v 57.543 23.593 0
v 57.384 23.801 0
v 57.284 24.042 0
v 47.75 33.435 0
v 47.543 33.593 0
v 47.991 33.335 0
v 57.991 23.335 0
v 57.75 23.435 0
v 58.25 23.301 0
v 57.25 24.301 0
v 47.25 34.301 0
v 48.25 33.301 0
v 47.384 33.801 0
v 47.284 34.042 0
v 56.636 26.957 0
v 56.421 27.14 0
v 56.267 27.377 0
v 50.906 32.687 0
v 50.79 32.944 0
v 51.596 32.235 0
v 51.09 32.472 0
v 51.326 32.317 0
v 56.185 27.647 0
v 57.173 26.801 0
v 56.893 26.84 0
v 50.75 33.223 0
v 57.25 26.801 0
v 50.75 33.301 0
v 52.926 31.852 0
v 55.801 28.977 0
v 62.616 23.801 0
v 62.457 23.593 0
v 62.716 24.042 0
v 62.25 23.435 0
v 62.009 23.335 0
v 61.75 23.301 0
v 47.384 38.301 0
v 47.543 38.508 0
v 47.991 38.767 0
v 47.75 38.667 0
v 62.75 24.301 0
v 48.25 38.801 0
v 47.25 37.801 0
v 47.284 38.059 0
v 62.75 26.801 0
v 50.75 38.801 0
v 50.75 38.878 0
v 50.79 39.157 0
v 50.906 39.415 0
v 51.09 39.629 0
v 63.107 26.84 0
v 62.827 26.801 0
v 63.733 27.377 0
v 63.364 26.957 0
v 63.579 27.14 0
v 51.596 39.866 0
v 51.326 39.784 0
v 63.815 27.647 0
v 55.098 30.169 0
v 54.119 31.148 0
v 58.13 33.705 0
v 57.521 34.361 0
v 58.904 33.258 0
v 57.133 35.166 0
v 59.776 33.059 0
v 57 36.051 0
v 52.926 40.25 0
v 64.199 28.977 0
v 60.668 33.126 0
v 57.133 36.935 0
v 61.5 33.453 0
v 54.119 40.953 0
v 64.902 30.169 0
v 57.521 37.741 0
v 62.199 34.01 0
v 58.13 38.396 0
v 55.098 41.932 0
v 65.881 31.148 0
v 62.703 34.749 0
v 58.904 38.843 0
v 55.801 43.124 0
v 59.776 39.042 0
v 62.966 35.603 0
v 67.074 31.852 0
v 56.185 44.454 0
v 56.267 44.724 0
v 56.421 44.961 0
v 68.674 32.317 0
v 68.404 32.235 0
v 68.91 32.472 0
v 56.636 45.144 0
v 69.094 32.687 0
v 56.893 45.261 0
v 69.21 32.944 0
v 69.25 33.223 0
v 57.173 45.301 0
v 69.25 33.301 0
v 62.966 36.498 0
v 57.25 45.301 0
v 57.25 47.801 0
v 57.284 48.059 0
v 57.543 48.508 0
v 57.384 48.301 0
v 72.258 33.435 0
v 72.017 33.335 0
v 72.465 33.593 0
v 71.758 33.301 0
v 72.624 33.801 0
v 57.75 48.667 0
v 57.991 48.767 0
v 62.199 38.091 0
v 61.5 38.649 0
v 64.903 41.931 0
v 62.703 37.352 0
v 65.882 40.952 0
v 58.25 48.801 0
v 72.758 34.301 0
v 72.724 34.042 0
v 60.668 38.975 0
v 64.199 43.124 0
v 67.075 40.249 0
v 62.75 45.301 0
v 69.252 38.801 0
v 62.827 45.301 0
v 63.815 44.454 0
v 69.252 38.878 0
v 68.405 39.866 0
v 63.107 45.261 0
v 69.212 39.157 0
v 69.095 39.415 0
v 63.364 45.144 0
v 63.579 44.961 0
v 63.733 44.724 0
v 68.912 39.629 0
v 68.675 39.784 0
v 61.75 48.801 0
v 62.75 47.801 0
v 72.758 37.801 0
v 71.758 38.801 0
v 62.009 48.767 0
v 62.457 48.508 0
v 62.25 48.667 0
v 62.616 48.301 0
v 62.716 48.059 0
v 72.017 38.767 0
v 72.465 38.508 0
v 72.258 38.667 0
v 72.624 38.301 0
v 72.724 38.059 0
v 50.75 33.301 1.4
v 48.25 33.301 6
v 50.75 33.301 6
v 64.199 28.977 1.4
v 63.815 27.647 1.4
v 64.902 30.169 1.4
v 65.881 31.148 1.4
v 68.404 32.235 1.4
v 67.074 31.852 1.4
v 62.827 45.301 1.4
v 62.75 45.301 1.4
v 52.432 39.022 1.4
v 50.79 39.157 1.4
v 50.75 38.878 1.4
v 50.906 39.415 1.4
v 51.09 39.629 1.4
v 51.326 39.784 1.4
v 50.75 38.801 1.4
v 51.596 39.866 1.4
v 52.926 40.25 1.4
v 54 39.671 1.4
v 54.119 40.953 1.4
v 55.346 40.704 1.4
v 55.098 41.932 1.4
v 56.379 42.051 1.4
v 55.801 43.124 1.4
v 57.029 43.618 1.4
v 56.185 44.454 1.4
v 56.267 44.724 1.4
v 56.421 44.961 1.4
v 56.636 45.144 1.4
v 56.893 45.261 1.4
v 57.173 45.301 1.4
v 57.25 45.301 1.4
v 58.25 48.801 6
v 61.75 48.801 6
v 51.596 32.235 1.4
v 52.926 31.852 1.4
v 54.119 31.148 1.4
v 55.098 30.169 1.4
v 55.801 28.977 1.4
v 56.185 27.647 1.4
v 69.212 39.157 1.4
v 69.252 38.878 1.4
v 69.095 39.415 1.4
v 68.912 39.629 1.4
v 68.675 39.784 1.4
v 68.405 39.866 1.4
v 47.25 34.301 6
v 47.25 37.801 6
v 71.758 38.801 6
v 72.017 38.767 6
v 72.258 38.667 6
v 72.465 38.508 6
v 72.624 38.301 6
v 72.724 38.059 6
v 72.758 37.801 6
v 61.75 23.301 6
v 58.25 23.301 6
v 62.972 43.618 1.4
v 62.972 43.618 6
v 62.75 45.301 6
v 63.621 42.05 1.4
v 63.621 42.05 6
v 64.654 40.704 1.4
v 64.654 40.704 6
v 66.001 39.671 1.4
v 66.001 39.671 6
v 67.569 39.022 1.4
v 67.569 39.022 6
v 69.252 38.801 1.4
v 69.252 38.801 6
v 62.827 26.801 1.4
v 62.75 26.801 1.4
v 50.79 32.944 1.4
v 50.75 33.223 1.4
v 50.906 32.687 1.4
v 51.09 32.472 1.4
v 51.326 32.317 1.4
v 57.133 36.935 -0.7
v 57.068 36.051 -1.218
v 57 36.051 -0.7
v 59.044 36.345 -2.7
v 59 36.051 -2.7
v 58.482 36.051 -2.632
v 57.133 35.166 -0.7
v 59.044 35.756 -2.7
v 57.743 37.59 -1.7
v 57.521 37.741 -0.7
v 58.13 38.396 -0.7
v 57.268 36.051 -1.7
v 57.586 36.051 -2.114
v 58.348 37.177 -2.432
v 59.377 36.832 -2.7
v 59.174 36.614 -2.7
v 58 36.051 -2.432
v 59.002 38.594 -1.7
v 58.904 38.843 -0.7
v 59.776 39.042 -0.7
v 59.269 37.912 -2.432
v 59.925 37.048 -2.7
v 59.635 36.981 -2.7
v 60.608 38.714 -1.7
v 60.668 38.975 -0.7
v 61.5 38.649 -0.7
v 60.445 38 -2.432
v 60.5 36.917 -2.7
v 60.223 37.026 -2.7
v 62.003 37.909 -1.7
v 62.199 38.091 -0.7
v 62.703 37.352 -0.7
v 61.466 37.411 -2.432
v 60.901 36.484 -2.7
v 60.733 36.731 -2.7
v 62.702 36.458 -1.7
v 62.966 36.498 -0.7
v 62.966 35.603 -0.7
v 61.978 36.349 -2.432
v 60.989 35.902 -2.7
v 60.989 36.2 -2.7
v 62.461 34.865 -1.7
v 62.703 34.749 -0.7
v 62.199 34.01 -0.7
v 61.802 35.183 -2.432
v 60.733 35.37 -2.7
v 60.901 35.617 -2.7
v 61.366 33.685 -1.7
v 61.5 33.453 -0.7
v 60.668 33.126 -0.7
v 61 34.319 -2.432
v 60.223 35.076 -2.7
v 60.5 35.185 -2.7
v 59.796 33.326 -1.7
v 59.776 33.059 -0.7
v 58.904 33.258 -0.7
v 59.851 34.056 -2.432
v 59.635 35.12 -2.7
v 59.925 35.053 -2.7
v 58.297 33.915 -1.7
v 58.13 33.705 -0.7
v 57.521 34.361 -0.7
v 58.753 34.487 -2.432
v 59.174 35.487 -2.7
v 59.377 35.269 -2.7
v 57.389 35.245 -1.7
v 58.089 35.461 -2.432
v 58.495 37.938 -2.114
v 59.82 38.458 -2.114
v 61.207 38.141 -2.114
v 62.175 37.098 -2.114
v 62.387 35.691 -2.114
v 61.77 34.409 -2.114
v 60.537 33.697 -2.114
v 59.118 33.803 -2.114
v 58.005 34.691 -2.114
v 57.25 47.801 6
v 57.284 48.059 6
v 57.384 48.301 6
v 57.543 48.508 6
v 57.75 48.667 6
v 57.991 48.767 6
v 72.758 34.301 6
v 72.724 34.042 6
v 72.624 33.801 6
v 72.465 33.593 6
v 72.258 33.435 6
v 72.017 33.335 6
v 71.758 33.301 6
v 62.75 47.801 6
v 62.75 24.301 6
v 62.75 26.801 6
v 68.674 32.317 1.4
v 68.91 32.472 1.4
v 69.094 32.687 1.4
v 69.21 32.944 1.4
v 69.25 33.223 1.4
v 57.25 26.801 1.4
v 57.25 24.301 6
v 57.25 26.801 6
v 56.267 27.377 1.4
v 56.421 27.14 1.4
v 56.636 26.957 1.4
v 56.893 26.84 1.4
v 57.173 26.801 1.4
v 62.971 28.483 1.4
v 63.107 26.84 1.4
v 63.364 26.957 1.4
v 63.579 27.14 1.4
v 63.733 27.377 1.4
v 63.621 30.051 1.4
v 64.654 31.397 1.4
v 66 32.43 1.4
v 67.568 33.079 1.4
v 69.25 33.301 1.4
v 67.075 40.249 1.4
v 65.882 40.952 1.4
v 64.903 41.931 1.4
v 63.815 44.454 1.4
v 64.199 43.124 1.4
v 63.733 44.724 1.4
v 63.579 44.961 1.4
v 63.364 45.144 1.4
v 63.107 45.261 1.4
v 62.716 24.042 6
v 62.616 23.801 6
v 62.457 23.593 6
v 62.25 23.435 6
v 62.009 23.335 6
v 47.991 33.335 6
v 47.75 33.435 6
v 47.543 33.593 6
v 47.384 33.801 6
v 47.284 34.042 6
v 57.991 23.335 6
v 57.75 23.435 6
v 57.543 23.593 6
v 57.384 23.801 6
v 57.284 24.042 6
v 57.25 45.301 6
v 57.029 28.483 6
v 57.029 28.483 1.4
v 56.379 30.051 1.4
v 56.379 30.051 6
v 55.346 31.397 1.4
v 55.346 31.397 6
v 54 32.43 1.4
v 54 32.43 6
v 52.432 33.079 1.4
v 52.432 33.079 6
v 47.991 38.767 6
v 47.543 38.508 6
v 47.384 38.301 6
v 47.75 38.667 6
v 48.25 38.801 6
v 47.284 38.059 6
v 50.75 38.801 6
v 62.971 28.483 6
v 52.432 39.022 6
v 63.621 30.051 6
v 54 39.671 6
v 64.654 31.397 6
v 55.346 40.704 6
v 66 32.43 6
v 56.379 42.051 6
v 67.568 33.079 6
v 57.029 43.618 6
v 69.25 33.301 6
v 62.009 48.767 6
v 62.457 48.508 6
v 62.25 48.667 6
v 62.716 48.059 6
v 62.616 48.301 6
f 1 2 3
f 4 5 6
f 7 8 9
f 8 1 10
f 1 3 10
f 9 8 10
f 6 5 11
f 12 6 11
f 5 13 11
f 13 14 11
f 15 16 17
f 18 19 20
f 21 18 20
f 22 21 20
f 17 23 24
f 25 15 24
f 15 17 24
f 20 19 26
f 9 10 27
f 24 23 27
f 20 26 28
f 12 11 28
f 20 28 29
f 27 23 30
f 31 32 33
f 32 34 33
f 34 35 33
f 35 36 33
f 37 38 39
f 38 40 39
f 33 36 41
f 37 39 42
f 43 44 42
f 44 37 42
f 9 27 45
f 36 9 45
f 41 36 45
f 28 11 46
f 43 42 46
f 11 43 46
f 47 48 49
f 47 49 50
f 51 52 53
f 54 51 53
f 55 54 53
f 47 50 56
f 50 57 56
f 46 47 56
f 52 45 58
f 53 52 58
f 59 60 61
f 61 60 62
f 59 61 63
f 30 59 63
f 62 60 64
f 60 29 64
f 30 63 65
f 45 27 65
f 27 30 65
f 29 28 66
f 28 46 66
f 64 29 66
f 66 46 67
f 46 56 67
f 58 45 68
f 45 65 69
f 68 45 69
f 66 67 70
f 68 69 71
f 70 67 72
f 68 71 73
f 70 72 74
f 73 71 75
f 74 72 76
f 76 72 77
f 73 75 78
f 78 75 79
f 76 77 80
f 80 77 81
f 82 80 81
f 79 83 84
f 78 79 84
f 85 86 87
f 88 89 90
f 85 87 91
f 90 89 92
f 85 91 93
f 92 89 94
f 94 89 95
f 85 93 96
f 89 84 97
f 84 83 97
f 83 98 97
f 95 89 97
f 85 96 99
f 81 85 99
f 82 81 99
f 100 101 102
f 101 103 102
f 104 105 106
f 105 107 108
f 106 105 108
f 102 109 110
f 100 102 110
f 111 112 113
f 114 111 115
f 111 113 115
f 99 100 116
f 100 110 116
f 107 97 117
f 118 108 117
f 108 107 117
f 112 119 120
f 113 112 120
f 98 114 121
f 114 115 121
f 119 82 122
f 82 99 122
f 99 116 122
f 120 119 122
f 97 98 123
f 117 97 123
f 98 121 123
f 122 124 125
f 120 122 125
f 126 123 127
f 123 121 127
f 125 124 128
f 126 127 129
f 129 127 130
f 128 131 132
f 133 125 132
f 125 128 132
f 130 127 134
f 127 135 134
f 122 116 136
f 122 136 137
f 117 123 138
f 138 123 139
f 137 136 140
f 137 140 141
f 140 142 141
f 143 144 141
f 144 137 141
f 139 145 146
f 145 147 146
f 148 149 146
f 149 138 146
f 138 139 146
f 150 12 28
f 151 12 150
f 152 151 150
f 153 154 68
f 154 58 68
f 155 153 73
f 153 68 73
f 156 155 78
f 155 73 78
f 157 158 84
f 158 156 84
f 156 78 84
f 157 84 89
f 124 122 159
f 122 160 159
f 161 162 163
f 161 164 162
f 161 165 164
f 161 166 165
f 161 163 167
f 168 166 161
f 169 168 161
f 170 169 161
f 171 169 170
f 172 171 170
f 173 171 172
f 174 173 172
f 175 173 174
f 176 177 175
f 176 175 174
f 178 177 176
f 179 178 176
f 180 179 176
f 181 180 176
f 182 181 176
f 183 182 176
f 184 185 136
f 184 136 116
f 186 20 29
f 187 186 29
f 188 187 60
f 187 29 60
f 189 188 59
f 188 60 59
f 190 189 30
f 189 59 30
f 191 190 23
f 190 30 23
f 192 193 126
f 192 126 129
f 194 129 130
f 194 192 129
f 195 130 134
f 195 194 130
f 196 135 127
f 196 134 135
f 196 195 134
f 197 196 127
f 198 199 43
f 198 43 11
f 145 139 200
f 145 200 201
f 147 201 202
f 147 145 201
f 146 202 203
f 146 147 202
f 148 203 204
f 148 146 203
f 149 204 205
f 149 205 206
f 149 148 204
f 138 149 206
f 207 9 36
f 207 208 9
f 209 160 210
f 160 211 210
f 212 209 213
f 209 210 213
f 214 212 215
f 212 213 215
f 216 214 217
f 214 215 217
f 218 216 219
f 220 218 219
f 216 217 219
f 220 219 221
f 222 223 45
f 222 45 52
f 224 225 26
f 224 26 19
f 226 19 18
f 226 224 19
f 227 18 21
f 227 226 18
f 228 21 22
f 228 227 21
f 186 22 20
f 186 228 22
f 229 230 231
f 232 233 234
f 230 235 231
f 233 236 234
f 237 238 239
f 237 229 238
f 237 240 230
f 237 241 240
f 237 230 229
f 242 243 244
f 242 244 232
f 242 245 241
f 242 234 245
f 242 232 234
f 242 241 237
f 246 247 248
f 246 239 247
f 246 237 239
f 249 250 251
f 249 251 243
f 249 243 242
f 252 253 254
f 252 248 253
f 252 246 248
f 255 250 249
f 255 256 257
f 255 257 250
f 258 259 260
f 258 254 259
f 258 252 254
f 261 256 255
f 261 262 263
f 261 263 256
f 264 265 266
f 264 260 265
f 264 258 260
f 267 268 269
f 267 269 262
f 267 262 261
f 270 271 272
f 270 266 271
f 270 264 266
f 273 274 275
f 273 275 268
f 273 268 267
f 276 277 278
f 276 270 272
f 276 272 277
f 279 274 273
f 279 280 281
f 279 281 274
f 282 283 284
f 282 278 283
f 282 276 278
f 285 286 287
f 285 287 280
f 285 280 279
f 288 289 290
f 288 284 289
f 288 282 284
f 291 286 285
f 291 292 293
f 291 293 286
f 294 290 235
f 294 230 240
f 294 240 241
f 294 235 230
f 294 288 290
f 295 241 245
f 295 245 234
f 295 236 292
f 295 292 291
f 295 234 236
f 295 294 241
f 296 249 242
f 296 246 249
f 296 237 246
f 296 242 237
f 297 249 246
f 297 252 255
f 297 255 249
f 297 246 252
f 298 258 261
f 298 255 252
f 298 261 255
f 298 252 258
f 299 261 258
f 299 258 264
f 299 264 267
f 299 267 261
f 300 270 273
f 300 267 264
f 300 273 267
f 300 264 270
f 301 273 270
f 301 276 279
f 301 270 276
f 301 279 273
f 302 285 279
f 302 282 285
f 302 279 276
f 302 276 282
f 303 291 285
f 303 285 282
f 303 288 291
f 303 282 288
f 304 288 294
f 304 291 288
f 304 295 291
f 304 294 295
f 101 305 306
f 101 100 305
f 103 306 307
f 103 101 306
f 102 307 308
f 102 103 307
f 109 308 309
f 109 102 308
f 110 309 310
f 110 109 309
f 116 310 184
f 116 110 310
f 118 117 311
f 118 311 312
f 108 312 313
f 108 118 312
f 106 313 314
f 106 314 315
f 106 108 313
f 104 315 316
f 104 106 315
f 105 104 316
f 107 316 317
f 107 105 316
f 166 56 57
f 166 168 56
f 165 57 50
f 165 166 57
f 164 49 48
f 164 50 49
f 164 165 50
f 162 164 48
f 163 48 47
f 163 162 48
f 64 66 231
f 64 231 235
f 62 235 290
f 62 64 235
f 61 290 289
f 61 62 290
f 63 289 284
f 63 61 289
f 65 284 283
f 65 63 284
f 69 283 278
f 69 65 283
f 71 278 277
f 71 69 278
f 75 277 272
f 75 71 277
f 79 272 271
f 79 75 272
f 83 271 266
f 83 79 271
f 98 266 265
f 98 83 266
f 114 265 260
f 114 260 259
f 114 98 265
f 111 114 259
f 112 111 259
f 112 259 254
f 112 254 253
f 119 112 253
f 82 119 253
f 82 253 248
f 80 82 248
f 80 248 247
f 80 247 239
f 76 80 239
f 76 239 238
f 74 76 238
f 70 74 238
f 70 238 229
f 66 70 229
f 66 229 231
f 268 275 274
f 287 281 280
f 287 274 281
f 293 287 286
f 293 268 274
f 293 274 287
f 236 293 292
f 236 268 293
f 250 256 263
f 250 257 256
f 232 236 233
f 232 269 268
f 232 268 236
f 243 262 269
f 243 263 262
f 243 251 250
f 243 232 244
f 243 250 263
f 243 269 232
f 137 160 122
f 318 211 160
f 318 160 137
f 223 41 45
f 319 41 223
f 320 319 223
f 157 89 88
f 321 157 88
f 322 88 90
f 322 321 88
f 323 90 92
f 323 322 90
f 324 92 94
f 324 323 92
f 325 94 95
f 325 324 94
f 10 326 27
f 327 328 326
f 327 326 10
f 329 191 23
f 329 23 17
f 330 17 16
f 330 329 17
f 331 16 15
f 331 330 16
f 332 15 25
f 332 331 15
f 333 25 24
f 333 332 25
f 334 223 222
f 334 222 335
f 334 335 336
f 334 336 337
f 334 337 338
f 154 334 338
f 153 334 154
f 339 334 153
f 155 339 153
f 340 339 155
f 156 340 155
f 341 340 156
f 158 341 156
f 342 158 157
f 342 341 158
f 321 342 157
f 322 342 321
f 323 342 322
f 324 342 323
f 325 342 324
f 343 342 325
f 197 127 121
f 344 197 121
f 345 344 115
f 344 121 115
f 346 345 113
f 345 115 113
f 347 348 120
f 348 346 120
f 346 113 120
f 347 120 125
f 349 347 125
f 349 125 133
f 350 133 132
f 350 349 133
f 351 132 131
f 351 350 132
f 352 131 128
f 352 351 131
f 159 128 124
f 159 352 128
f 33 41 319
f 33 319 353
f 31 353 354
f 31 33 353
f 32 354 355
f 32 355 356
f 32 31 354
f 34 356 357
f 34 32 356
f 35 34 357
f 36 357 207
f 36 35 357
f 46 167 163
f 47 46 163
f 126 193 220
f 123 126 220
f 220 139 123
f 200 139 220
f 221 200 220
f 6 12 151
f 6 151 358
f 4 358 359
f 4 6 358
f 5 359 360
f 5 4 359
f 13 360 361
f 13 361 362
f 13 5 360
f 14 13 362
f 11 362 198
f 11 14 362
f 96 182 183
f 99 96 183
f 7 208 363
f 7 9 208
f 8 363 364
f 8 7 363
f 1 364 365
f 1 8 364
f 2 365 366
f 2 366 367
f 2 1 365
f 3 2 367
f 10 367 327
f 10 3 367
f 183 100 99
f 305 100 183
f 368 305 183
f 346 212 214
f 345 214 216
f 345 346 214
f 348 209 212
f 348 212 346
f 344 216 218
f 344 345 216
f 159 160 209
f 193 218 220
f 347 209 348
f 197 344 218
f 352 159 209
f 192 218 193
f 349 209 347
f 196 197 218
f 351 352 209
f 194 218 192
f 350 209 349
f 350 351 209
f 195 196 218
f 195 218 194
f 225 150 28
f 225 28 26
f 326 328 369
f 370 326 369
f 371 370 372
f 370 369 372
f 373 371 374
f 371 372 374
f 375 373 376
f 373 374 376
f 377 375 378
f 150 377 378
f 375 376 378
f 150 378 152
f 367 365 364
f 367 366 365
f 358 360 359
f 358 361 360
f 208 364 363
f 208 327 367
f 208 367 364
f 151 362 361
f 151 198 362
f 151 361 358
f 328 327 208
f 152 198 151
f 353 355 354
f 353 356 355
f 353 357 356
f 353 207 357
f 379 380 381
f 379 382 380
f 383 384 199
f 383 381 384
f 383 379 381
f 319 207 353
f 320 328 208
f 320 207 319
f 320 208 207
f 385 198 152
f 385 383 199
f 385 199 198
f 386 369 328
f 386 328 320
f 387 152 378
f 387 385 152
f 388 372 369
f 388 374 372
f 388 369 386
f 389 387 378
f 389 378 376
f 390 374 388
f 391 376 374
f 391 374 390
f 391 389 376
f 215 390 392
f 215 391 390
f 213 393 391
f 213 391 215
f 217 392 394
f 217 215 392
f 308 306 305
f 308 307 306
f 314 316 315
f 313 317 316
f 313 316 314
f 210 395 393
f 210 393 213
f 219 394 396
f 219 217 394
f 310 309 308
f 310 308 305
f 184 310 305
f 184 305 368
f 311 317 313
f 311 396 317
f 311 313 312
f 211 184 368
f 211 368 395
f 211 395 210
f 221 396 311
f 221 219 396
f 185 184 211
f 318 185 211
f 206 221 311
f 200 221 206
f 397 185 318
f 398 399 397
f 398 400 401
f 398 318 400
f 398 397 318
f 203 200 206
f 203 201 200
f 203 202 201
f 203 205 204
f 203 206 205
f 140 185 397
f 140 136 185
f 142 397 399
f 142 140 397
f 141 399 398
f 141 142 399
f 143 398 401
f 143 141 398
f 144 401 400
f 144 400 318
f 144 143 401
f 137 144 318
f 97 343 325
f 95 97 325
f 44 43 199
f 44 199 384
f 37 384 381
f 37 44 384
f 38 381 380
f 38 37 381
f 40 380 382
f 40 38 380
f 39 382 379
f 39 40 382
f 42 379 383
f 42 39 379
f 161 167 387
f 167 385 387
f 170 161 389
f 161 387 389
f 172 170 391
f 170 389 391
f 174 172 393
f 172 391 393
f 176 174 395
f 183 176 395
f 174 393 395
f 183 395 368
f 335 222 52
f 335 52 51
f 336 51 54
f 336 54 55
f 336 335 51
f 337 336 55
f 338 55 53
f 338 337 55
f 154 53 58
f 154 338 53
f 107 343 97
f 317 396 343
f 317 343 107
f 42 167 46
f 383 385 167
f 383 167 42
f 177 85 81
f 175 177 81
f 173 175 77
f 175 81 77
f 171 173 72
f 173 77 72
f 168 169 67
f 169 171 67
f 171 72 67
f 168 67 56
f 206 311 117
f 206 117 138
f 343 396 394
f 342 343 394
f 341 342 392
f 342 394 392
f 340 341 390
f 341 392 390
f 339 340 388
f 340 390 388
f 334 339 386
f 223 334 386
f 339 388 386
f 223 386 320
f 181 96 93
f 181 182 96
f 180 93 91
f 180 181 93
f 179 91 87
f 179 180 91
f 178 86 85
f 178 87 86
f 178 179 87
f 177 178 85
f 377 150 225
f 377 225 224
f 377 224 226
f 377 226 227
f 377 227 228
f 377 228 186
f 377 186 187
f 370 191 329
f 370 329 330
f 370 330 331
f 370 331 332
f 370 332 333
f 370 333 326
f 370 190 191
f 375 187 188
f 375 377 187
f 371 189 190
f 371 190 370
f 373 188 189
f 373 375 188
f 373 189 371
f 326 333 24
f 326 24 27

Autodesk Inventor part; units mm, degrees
ref_plane "YZ Plane" through (0, 0, 0) normal (1, 0, 0) x (0, 1, 0)
ref_plane "XZ Plane" through (0, 0, 0) normal (0, 1, 0) x (-1, 0, 0)
ref_plane "XY Plane" through (0, 0, 0) normal (0, 0, 1) x (1, 0, 0)
sketch "Sketch1" plane through (0, 0, 0) normal (0, 0, 1) x (1, 0, 0)
  line L0 (50.75, 32.3006) -> (46.25, 32.3006)
  line L1 (46.25, 32.3006) -> (46.25, 39.8006)
  line L2 (46.25, 39.8006) -> (50.75, 39.8006)
  arc A0 (50.75, 39.8006) -> (56.25, 45.3006) centre (50.75, 45.3006) ccw
  line L3 (56.25, 45.3006) -> (56.25, 49.8006)
  line L4 (56.25, 49.8006) -> (63.75, 49.8006)
  line L5 (63.75, 49.8006) -> (63.75, 45.3006)
  arc A1 (63.75, 45.3006) -> (69.2516, 39.8006) centre (69.25, 45.3006) ccw
  line L6 (69.2516, 39.8006) -> (73.7503, 39.8165)
  line L7 (73.7503, 39.8165) -> (73.7589, 32.3006)
  line L8 (73.7589, 32.3006) -> (69.25, 32.3006)
  arc A2 (69.25, 32.3006) -> (63.75, 26.8006) centre (69.25, 26.8006) ccw
  line L9 (63.75, 26.8006) -> (63.75, 22.3006)
  line L10 (63.75, 22.3006) -> (56.25, 22.3006)
  line L11 (56.25, 22.3006) -> (56.25, 26.8006)
  arc A3 (56.25, 26.8006) -> (50.75, 32.3006) centre (50.75, 26.8006) ccw
  line L12 (47.25, 33.3006) -> (50.75, 33.3006)
  arc A4 (57.25, 26.8006) -> (50.75, 33.3006) centre (50.75, 26.8006) ccw
  line L13 (57.25, 26.8006) -> (57.25, 23.3006)
  line L14 (57.25, 23.3006) -> (62.75, 23.3006)
  line L15 (62.75, 23.3006) -> (62.75, 26.8006)
  arc A5 (69.25, 33.3006) -> (62.75, 26.8006) centre (69.25, 26.8006) ccw
  line L16 (69.25, 33.3006) -> (72.7578, 33.3006)
  line L17 (72.7578, 33.3006) -> (72.7514, 38.813)
  line L18 (72.7514, 38.813) -> (69.2535, 38.8006)
  arc A6 (62.75, 45.3006) -> (69.2535, 38.8006) centre (69.25, 45.3006) ccw
  line L19 (62.75, 45.3006) -> (62.75, 48.8006)
  line L20 (62.75, 48.8006) -> (57.25, 48.8006)
  line L21 (57.25, 48.8006) -> (57.25, 45.3006)
  arc A7 (50.75, 38.8006) -> (57.25, 45.3006) centre (50.75, 45.3006) ccw
  line L22 (50.75, 38.8006) -> (47.25, 38.8006)
  line L23 (47.25, 38.8006) -> (47.25, 33.3006)
  point P0 (0, 0)
  dimension "d47" = 1
extrude "Extrusion1" add sketch "Sketch1" along normal blind 6 contours L0 L1 L2 A0 L3 L4 L5 A1 L6 L7 L8 A2 L9 L10 L11 A3 | L23 L22 A7 L21 L20 L19 A6 L18 L17 L16 A5 L15 L14 L13 A4 L12
sketch "Sketch2" plane through (0, 0, 6) normal (0, 0, 1) x (1, 0, 0)
  line L0 (50.75, 32.3006) -> (46.25, 32.3006)
  line L1 (46.25, 32.3006) -> (46.25, 39.8006)
  line L2 (46.25, 39.8006) -> (50.75, 39.8006)
  arc A0 (50.75, 39.8006) -> (56.25, 45.3006) centre (50.75, 45.3006) ccw
  line L3 (56.25, 49.8006) -> (63.75, 49.8006)
  line L4 (63.75, 49.8006) -> (63.75, 45.3006)
  arc A1 (63.75, 45.3006) -> (69.2516, 39.8006) centre (69.25, 45.3006) ccw
  line L5 (69.2516, 39.8006) -> (73.7498, 39.8006)
  line L6 (73.7498, 39.8006) -> (73.732, 32.3006)
  line L7 (73.732, 32.3006) -> (69.25, 32.3006)
  arc A2 (69.25, 32.3006) -> (63.75, 26.8006) centre (69.25, 26.8006) ccw
  line L8 (63.75, 26.8006) -> (63.75, 22.3006)
  line L9 (63.75, 22.3006) -> (56.25, 22.3006)
  line L10 (56.25, 22.3006) -> (56.25, 26.8006)
  arc A3 (56.25, 26.8006) -> (50.75, 32.3006) centre (50.75, 26.8006) ccw
  line L11 (47.25, 33.3006) -> (50.75, 33.3006)
  arc A4 (57.25, 26.8006) -> (50.75, 33.3006) centre (50.75, 26.8006) ccw
  line L12 (57.25, 26.8006) -> (57.25, 23.3006)
  line L13 (57.25, 23.3006) -> (62.75, 23.3006)
  line L14 (62.75, 23.3006) -> (62.75, 26.8006)
  arc A5 (69.25, 33.3006) -> (62.75, 26.8006) centre (69.25, 26.8006) ccw
  line L15 (69.25, 33.3006) -> (72.7343, 33.3006)
  line L16 (72.7343, 33.3006) -> (72.7474, 38.8006)
  line L17 (72.7474, 38.8006) -> (69.2516, 38.8006)
  arc A6 (62.75, 45.3006) -> (69.2516, 38.8006) centre (69.25, 45.3006) ccw
  line L18 (62.75, 45.3006) -> (62.75, 48.8006)
  line L19 (62.75, 48.8006) -> (57.25, 48.8006)
  line L20 (57.25, 48.8006) -> (57.25, 45.3006)
  arc A7 (50.75, 38.8006) -> (57.25, 45.3006) centre (50.75, 45.3006) ccw
  line L21 (50.75, 38.8006) -> (47.25, 38.8006)
  line L22 (47.25, 38.8006) -> (47.25, 33.3006)
  line L23 (50.75, 33.3006) -> (50.75, 32.3006)
  line L24 (50.75, 38.8006) -> (50.75, 39.8006)
  line L25 (56.25, 49.8006) -> (56.25, 45.3006)
  line L26 (56.25, 45.3006) -> (57.25, 45.3006)
  line L27 (62.75, 45.3006) -> (63.75, 45.3006)
  line L28 (69.2516, 38.8006) -> (69.2516, 39.8006)
  line L29 (69.25, 33.3006) -> (69.25, 32.3006)
  line L30 (62.75, 26.8006) -> (63.75, 26.8006)
  line L31 (56.25, 26.8006) -> (56.25, 22.3006) projected
  line L32 (56.25, 26.8006) -> (57.25, 26.8006)
  dimension "d48" = 1
sketch "Sketch4" plane through (0, 0, 0) normal (0, 0, -1) x (-1, 0, 0)
  line L0 (-73.75, 32.3006) -> (-73.75, 39.8006) projected
  line L1 (-73.75, 36.0506) -> (-46.25, 36.0506)
  line L2 (-46.25, 39.8006) -> (-46.25, 32.3006) projected
  circle A0 centre (-60, 36.0506) radius 3
  point P0 (0, 0)
  dimension "d31" = 6
extrude "Extrusion4" add sketch "Sketch4" along normal blind 2.7
fillet "Fillet4" radius 2 1 edges at (63, 36.0506, -2.7)
extrude "Extrusion7" cut sketch "Sketch2" against normal blind 4.6 contours L23 A4 L32 A3 | A0 L26 A7 L24 | L30 A5 L29 A2 | A1 L28 A6 L27
sketch "Sketch5" plane through (0, 0, 6) normal (0, 0, 1) x (1, 0, 0)
  line L0 (62.75, 23.3006) -> (62.75, 26.8006)
  line L1 (63.75, 26.8006) -> (63.75, 22.3006)
  line L2 (57.25, 26.8006) -> (57.25, 23.3006)
  line L3 (57.25, 23.3006) -> (62.75, 23.3006)
  line L4 (56.25, 22.3006) -> (56.25, 26.8006)
  line L5 (63.75, 22.3006) -> (56.25, 22.3006)
  line L6 (56.25, 49.8006) -> (63.75, 49.8006)
  line L7 (63.75, 49.8006) -> (63.75, 45.3006)
  line L8 (57.25, 48.8006) -> (57.25, 45.3006)
  line L9 (62.75, 48.8006) -> (57.25, 48.8006)
  line L10 (62.75, 45.3006) -> (62.75, 48.8006)
  line L11 (50.75, 32.3006) -> (46.25, 32.3006)
  line L12 (46.25, 32.3006) -> (46.25, 39.8006)
  line L13 (46.25, 39.8006) -> (50.75, 39.8006)
  line L14 (47.25, 33.3006) -> (50.75, 33.3006)
  line L15 (47.25, 38.8006) -> (47.25, 33.3006)
  line L16 (50.75, 38.8006) -> (47.25, 38.8006)
  line L17 (50.75, 33.3006) -> (50.75, 32.3006)
  line L18 (50.75, 38.8006) -> (50.75, 39.8006)
  line L19 (56.25, 49.8006) -> (56.25, 45.3006)
  line L20 (56.25, 45.3006) -> (57.25, 45.3006)
  line L21 (62.75, 45.3006) -> (63.75, 45.3006)
  line L22 (62.75, 26.8006) -> (63.75, 26.8006)
  line L23 (56.25, 26.8006) -> (56.25, 22.3006)
  line L24 (56.25, 26.8006) -> (57.25, 26.8006)
  line L25 (73.7589, 32.3006) -> (69.25, 32.3006) projected
  line L26 (69.25, 32.3006) -> (73.7589, 32.3006)
  line L27 (73.7589, 32.3006) -> (73.7503, 39.8165) projected
  line L28 (73.7589, 32.3006) -> (73.7503, 39.8165)
  line L29 (69.2516, 39.8006) -> (73.7503, 39.8165) projected
  line L30 (73.7503, 39.8165) -> (69.2516, 39.8006)
  line L31 (69.2516, 39.8006) -> (69.2516, 38.8006) projected
  line L32 (69.2516, 39.8006) -> (69.2516, 38.8006)
  line L33 (69.25, 33.3006) -> (69.25, 32.3006) projected
  line L34 (69.25, 32.3006) -> (69.25, 33.3006)
  line L35 (69.25, 33.3006) -> (72.7582, 33.3006)
  line L36 (72.7582, 33.3006) -> (72.7582, 38.8006)
  line L37 (72.7582, 38.8006) -> (69.2516, 38.8006)
  point P0 (0, 0)
  point P1 (50.75, 26.8006)
  dimension "d51" = 1
extrude "Extrusion8" cut sketch "Sketch5" against normal blind 6
fillet "Fillet6" radius 1 8 edges at (72.7582, 33.3006, 3) (72.7582, 38.8006, 3) (62.75, 23.3006, 3) (57.25, 23.3006, 3) (62.75, 48.8006, 3) (57.25, 48.8006, 3) (47.25, 38.8006, 3) (47.25, 33.3006, 3)
fillet "Fillet7" radius 1 8 edges at (69.25, 32.3006, 0.7) (63.75, 26.8006, 0.7) (69.2516, 39.8006, 0.7) (63.75, 45.3006, 0.7) (56.25, 26.8006, 0.7) (50.75, 32.3006, 0.7) (56.25, 45.3006, 0.7) (50.75, 39.8006, 0.7)
properties part number "Groboy Buttons D-Pad"
